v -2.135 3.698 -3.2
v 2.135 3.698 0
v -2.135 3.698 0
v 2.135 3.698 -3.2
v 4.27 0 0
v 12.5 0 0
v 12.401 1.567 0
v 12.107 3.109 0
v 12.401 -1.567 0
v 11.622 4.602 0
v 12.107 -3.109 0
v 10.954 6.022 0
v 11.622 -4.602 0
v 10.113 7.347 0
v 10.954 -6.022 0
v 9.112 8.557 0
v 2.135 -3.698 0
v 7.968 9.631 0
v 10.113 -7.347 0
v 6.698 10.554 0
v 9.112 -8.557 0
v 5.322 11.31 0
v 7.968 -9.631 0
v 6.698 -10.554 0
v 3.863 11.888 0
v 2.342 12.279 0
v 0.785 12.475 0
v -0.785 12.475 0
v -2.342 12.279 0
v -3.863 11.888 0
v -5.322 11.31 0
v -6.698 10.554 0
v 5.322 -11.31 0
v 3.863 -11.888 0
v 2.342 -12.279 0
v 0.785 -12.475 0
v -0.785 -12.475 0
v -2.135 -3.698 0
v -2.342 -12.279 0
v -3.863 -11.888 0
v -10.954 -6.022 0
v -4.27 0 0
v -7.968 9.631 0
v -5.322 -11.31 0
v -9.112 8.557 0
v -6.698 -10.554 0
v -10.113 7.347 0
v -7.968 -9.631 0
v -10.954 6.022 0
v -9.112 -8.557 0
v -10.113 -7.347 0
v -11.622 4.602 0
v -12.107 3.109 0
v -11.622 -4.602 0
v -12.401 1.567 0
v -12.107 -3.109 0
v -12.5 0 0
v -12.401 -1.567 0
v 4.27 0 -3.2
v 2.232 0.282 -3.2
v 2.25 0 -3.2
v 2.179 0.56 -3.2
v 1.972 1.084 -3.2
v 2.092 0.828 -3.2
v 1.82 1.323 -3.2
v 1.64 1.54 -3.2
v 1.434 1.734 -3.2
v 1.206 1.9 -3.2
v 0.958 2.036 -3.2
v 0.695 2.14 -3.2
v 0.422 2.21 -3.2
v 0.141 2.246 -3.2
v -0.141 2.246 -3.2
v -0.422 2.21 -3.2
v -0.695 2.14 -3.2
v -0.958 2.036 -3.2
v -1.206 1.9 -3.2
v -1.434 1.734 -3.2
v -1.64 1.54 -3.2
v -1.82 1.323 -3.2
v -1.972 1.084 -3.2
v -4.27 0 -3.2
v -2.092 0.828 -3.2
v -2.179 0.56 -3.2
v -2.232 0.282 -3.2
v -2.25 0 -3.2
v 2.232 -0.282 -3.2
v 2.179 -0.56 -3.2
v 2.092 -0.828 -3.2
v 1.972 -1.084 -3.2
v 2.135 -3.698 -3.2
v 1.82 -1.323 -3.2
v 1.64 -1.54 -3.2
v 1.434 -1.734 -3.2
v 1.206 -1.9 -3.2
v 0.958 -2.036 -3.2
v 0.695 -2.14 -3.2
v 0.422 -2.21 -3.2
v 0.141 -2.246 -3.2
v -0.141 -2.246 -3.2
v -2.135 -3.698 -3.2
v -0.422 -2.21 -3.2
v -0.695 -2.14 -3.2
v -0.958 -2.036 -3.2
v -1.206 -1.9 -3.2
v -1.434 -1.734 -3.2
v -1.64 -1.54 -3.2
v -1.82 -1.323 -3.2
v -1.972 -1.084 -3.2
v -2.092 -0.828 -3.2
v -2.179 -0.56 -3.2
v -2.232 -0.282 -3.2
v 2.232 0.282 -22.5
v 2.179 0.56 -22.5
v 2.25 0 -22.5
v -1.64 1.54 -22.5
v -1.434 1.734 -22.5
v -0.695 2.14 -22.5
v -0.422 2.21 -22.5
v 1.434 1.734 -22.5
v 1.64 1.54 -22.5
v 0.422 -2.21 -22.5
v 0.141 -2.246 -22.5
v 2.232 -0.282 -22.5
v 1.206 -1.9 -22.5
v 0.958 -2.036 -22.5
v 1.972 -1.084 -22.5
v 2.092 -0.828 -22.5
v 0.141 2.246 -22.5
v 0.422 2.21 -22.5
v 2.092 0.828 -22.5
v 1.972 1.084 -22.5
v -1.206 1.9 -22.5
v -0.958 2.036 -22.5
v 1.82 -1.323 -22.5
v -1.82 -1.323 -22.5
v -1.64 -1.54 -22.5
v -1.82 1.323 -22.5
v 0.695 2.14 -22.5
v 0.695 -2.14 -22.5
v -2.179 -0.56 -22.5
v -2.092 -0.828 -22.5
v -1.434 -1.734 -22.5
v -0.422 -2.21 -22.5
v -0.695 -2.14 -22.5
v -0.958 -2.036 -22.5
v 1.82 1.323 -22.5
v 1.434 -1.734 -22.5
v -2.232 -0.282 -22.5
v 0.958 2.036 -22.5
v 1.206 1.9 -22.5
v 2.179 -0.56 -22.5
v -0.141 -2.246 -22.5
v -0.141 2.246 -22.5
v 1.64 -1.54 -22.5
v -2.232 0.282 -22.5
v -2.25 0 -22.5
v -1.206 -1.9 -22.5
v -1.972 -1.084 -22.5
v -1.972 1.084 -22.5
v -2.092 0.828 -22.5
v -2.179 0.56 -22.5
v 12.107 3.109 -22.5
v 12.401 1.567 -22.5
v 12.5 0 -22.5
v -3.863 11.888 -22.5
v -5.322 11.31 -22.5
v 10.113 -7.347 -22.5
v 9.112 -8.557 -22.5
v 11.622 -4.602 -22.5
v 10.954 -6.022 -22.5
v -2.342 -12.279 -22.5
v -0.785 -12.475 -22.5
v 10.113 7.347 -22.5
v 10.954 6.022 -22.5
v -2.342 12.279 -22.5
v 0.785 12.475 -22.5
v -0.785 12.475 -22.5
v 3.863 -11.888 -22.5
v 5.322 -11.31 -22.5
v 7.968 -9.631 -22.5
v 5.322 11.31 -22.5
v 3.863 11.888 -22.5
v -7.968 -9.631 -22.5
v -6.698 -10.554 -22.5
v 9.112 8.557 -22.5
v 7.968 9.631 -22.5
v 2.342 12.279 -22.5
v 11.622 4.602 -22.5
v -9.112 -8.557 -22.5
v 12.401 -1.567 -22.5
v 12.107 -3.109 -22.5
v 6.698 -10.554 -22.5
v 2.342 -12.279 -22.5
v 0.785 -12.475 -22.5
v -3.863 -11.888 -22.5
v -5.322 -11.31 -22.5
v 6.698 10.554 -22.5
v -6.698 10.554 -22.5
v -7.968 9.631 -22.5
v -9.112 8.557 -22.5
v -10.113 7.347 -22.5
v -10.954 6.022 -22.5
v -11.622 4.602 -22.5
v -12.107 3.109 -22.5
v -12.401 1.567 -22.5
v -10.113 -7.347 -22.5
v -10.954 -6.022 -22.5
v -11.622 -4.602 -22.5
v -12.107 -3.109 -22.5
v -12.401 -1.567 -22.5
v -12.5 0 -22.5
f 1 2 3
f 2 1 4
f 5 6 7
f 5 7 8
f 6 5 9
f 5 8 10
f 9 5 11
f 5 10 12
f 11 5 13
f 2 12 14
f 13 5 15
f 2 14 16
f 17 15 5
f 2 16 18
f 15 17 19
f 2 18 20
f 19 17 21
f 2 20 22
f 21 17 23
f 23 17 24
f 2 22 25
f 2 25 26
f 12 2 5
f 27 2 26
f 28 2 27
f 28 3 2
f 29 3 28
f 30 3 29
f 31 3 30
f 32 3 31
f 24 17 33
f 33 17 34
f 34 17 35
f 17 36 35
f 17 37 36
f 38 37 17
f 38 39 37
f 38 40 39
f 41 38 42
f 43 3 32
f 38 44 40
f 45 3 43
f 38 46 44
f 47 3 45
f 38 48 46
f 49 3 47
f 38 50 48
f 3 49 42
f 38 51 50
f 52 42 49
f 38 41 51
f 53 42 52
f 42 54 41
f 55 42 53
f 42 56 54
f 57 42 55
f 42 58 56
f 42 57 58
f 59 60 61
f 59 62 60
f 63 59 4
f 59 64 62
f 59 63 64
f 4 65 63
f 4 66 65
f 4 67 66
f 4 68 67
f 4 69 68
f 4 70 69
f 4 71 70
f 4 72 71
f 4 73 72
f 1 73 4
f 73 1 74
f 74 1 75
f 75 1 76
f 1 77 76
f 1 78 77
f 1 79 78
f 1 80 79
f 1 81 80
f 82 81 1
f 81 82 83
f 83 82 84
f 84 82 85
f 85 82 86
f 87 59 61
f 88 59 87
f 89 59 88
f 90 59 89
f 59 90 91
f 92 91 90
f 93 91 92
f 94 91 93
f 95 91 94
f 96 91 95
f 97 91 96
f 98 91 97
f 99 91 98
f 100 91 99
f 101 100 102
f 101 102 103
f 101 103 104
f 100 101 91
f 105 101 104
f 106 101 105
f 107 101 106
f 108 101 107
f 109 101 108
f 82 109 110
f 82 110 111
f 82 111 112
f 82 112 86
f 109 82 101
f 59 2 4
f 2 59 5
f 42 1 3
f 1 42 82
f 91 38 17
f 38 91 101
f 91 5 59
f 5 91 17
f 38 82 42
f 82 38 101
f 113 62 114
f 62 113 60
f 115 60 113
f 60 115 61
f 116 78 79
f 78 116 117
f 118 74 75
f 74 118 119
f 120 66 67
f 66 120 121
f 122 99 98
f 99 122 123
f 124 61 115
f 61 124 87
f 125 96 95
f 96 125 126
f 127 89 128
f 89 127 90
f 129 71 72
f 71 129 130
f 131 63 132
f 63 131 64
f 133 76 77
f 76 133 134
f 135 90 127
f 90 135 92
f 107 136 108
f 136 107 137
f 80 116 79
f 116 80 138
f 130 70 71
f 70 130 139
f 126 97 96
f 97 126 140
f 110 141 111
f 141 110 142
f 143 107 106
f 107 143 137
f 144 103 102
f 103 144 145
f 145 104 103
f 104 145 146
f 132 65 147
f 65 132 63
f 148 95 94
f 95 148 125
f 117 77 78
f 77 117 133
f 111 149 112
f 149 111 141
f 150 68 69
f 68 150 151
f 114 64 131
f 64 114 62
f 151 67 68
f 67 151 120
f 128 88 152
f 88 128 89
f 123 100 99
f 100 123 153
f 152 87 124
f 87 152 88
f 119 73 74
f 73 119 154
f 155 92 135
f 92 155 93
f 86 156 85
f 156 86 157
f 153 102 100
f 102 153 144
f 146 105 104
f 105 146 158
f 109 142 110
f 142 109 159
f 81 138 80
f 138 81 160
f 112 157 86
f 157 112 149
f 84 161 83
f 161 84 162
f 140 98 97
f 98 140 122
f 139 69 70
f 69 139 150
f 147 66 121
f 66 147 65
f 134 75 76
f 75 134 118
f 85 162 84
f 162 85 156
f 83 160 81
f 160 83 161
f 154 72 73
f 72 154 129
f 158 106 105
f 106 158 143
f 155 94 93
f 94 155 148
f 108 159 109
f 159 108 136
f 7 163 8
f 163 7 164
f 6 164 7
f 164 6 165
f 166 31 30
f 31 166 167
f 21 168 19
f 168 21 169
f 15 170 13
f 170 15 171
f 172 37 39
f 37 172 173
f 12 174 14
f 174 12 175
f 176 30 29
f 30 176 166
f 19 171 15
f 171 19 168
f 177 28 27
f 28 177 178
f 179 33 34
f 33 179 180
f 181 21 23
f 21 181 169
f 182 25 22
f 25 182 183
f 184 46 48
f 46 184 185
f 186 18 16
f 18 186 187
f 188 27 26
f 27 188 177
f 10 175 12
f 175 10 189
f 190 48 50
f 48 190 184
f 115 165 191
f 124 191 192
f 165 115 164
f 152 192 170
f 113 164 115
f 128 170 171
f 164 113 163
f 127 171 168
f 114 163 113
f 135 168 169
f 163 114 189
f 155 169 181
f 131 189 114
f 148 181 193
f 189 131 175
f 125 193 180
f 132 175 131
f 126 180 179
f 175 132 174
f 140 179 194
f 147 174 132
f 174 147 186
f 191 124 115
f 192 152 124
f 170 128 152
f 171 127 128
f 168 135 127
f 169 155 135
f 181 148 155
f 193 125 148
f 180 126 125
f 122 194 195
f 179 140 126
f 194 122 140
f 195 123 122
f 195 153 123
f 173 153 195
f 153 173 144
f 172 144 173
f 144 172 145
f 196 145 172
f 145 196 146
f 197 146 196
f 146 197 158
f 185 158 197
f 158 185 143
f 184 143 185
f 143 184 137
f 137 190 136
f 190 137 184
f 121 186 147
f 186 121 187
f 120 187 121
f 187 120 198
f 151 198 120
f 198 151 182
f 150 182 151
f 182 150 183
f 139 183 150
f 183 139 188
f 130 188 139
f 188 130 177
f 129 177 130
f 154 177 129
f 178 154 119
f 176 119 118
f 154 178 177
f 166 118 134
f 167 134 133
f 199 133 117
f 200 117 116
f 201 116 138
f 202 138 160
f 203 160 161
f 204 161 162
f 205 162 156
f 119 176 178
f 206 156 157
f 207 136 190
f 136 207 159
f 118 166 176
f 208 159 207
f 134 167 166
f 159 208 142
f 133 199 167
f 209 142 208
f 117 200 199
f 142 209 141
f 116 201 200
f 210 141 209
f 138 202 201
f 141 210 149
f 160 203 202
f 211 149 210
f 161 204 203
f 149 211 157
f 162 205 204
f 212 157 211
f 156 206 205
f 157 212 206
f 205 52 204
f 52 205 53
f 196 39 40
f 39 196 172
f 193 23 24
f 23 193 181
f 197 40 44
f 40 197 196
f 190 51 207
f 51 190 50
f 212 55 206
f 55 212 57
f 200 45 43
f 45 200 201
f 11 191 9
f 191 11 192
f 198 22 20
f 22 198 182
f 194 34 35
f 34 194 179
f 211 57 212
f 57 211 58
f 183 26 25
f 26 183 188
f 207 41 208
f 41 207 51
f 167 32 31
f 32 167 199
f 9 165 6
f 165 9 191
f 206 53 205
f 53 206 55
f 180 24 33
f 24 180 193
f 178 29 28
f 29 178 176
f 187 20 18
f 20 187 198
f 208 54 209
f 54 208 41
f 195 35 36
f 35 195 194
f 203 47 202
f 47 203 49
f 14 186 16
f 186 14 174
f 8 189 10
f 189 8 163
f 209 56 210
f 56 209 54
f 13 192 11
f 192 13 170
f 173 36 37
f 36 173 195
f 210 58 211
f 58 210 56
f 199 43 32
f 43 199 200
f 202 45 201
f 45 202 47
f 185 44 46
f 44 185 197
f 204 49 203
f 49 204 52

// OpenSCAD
$fn = 50;

difference() {
	union() {
		translate(v = [0, 0, -22.5]) {
			cylinder(h = 22.5, r = 12.5);
		}
	}
	union() {
		translate(v = [0, 0, 0]) {
			rotate(a = [0, 0, 0]) {
				difference() {
					union() {
						translate(v = [0, 0, -3.2]) {
							linear_extrude(height = 3.2) {
								polygon(points = [[4.2698, 0.0], [2.1349000000000005, 3.697755269078796], [-2.134899999999999, 3.6977552690787965], [-4.2698, 5.228996902999369e-16], [-2.134900000000002, -3.6977552690787956], [2.1348999999999974, -3.697755269078798]]);
							}
						}
					}
					union();
				}
			}
		}
		#translate(v = [0, 0, -100.0]) {
			cylinder(h = 200, r = 2.25);
		}
	}
}
